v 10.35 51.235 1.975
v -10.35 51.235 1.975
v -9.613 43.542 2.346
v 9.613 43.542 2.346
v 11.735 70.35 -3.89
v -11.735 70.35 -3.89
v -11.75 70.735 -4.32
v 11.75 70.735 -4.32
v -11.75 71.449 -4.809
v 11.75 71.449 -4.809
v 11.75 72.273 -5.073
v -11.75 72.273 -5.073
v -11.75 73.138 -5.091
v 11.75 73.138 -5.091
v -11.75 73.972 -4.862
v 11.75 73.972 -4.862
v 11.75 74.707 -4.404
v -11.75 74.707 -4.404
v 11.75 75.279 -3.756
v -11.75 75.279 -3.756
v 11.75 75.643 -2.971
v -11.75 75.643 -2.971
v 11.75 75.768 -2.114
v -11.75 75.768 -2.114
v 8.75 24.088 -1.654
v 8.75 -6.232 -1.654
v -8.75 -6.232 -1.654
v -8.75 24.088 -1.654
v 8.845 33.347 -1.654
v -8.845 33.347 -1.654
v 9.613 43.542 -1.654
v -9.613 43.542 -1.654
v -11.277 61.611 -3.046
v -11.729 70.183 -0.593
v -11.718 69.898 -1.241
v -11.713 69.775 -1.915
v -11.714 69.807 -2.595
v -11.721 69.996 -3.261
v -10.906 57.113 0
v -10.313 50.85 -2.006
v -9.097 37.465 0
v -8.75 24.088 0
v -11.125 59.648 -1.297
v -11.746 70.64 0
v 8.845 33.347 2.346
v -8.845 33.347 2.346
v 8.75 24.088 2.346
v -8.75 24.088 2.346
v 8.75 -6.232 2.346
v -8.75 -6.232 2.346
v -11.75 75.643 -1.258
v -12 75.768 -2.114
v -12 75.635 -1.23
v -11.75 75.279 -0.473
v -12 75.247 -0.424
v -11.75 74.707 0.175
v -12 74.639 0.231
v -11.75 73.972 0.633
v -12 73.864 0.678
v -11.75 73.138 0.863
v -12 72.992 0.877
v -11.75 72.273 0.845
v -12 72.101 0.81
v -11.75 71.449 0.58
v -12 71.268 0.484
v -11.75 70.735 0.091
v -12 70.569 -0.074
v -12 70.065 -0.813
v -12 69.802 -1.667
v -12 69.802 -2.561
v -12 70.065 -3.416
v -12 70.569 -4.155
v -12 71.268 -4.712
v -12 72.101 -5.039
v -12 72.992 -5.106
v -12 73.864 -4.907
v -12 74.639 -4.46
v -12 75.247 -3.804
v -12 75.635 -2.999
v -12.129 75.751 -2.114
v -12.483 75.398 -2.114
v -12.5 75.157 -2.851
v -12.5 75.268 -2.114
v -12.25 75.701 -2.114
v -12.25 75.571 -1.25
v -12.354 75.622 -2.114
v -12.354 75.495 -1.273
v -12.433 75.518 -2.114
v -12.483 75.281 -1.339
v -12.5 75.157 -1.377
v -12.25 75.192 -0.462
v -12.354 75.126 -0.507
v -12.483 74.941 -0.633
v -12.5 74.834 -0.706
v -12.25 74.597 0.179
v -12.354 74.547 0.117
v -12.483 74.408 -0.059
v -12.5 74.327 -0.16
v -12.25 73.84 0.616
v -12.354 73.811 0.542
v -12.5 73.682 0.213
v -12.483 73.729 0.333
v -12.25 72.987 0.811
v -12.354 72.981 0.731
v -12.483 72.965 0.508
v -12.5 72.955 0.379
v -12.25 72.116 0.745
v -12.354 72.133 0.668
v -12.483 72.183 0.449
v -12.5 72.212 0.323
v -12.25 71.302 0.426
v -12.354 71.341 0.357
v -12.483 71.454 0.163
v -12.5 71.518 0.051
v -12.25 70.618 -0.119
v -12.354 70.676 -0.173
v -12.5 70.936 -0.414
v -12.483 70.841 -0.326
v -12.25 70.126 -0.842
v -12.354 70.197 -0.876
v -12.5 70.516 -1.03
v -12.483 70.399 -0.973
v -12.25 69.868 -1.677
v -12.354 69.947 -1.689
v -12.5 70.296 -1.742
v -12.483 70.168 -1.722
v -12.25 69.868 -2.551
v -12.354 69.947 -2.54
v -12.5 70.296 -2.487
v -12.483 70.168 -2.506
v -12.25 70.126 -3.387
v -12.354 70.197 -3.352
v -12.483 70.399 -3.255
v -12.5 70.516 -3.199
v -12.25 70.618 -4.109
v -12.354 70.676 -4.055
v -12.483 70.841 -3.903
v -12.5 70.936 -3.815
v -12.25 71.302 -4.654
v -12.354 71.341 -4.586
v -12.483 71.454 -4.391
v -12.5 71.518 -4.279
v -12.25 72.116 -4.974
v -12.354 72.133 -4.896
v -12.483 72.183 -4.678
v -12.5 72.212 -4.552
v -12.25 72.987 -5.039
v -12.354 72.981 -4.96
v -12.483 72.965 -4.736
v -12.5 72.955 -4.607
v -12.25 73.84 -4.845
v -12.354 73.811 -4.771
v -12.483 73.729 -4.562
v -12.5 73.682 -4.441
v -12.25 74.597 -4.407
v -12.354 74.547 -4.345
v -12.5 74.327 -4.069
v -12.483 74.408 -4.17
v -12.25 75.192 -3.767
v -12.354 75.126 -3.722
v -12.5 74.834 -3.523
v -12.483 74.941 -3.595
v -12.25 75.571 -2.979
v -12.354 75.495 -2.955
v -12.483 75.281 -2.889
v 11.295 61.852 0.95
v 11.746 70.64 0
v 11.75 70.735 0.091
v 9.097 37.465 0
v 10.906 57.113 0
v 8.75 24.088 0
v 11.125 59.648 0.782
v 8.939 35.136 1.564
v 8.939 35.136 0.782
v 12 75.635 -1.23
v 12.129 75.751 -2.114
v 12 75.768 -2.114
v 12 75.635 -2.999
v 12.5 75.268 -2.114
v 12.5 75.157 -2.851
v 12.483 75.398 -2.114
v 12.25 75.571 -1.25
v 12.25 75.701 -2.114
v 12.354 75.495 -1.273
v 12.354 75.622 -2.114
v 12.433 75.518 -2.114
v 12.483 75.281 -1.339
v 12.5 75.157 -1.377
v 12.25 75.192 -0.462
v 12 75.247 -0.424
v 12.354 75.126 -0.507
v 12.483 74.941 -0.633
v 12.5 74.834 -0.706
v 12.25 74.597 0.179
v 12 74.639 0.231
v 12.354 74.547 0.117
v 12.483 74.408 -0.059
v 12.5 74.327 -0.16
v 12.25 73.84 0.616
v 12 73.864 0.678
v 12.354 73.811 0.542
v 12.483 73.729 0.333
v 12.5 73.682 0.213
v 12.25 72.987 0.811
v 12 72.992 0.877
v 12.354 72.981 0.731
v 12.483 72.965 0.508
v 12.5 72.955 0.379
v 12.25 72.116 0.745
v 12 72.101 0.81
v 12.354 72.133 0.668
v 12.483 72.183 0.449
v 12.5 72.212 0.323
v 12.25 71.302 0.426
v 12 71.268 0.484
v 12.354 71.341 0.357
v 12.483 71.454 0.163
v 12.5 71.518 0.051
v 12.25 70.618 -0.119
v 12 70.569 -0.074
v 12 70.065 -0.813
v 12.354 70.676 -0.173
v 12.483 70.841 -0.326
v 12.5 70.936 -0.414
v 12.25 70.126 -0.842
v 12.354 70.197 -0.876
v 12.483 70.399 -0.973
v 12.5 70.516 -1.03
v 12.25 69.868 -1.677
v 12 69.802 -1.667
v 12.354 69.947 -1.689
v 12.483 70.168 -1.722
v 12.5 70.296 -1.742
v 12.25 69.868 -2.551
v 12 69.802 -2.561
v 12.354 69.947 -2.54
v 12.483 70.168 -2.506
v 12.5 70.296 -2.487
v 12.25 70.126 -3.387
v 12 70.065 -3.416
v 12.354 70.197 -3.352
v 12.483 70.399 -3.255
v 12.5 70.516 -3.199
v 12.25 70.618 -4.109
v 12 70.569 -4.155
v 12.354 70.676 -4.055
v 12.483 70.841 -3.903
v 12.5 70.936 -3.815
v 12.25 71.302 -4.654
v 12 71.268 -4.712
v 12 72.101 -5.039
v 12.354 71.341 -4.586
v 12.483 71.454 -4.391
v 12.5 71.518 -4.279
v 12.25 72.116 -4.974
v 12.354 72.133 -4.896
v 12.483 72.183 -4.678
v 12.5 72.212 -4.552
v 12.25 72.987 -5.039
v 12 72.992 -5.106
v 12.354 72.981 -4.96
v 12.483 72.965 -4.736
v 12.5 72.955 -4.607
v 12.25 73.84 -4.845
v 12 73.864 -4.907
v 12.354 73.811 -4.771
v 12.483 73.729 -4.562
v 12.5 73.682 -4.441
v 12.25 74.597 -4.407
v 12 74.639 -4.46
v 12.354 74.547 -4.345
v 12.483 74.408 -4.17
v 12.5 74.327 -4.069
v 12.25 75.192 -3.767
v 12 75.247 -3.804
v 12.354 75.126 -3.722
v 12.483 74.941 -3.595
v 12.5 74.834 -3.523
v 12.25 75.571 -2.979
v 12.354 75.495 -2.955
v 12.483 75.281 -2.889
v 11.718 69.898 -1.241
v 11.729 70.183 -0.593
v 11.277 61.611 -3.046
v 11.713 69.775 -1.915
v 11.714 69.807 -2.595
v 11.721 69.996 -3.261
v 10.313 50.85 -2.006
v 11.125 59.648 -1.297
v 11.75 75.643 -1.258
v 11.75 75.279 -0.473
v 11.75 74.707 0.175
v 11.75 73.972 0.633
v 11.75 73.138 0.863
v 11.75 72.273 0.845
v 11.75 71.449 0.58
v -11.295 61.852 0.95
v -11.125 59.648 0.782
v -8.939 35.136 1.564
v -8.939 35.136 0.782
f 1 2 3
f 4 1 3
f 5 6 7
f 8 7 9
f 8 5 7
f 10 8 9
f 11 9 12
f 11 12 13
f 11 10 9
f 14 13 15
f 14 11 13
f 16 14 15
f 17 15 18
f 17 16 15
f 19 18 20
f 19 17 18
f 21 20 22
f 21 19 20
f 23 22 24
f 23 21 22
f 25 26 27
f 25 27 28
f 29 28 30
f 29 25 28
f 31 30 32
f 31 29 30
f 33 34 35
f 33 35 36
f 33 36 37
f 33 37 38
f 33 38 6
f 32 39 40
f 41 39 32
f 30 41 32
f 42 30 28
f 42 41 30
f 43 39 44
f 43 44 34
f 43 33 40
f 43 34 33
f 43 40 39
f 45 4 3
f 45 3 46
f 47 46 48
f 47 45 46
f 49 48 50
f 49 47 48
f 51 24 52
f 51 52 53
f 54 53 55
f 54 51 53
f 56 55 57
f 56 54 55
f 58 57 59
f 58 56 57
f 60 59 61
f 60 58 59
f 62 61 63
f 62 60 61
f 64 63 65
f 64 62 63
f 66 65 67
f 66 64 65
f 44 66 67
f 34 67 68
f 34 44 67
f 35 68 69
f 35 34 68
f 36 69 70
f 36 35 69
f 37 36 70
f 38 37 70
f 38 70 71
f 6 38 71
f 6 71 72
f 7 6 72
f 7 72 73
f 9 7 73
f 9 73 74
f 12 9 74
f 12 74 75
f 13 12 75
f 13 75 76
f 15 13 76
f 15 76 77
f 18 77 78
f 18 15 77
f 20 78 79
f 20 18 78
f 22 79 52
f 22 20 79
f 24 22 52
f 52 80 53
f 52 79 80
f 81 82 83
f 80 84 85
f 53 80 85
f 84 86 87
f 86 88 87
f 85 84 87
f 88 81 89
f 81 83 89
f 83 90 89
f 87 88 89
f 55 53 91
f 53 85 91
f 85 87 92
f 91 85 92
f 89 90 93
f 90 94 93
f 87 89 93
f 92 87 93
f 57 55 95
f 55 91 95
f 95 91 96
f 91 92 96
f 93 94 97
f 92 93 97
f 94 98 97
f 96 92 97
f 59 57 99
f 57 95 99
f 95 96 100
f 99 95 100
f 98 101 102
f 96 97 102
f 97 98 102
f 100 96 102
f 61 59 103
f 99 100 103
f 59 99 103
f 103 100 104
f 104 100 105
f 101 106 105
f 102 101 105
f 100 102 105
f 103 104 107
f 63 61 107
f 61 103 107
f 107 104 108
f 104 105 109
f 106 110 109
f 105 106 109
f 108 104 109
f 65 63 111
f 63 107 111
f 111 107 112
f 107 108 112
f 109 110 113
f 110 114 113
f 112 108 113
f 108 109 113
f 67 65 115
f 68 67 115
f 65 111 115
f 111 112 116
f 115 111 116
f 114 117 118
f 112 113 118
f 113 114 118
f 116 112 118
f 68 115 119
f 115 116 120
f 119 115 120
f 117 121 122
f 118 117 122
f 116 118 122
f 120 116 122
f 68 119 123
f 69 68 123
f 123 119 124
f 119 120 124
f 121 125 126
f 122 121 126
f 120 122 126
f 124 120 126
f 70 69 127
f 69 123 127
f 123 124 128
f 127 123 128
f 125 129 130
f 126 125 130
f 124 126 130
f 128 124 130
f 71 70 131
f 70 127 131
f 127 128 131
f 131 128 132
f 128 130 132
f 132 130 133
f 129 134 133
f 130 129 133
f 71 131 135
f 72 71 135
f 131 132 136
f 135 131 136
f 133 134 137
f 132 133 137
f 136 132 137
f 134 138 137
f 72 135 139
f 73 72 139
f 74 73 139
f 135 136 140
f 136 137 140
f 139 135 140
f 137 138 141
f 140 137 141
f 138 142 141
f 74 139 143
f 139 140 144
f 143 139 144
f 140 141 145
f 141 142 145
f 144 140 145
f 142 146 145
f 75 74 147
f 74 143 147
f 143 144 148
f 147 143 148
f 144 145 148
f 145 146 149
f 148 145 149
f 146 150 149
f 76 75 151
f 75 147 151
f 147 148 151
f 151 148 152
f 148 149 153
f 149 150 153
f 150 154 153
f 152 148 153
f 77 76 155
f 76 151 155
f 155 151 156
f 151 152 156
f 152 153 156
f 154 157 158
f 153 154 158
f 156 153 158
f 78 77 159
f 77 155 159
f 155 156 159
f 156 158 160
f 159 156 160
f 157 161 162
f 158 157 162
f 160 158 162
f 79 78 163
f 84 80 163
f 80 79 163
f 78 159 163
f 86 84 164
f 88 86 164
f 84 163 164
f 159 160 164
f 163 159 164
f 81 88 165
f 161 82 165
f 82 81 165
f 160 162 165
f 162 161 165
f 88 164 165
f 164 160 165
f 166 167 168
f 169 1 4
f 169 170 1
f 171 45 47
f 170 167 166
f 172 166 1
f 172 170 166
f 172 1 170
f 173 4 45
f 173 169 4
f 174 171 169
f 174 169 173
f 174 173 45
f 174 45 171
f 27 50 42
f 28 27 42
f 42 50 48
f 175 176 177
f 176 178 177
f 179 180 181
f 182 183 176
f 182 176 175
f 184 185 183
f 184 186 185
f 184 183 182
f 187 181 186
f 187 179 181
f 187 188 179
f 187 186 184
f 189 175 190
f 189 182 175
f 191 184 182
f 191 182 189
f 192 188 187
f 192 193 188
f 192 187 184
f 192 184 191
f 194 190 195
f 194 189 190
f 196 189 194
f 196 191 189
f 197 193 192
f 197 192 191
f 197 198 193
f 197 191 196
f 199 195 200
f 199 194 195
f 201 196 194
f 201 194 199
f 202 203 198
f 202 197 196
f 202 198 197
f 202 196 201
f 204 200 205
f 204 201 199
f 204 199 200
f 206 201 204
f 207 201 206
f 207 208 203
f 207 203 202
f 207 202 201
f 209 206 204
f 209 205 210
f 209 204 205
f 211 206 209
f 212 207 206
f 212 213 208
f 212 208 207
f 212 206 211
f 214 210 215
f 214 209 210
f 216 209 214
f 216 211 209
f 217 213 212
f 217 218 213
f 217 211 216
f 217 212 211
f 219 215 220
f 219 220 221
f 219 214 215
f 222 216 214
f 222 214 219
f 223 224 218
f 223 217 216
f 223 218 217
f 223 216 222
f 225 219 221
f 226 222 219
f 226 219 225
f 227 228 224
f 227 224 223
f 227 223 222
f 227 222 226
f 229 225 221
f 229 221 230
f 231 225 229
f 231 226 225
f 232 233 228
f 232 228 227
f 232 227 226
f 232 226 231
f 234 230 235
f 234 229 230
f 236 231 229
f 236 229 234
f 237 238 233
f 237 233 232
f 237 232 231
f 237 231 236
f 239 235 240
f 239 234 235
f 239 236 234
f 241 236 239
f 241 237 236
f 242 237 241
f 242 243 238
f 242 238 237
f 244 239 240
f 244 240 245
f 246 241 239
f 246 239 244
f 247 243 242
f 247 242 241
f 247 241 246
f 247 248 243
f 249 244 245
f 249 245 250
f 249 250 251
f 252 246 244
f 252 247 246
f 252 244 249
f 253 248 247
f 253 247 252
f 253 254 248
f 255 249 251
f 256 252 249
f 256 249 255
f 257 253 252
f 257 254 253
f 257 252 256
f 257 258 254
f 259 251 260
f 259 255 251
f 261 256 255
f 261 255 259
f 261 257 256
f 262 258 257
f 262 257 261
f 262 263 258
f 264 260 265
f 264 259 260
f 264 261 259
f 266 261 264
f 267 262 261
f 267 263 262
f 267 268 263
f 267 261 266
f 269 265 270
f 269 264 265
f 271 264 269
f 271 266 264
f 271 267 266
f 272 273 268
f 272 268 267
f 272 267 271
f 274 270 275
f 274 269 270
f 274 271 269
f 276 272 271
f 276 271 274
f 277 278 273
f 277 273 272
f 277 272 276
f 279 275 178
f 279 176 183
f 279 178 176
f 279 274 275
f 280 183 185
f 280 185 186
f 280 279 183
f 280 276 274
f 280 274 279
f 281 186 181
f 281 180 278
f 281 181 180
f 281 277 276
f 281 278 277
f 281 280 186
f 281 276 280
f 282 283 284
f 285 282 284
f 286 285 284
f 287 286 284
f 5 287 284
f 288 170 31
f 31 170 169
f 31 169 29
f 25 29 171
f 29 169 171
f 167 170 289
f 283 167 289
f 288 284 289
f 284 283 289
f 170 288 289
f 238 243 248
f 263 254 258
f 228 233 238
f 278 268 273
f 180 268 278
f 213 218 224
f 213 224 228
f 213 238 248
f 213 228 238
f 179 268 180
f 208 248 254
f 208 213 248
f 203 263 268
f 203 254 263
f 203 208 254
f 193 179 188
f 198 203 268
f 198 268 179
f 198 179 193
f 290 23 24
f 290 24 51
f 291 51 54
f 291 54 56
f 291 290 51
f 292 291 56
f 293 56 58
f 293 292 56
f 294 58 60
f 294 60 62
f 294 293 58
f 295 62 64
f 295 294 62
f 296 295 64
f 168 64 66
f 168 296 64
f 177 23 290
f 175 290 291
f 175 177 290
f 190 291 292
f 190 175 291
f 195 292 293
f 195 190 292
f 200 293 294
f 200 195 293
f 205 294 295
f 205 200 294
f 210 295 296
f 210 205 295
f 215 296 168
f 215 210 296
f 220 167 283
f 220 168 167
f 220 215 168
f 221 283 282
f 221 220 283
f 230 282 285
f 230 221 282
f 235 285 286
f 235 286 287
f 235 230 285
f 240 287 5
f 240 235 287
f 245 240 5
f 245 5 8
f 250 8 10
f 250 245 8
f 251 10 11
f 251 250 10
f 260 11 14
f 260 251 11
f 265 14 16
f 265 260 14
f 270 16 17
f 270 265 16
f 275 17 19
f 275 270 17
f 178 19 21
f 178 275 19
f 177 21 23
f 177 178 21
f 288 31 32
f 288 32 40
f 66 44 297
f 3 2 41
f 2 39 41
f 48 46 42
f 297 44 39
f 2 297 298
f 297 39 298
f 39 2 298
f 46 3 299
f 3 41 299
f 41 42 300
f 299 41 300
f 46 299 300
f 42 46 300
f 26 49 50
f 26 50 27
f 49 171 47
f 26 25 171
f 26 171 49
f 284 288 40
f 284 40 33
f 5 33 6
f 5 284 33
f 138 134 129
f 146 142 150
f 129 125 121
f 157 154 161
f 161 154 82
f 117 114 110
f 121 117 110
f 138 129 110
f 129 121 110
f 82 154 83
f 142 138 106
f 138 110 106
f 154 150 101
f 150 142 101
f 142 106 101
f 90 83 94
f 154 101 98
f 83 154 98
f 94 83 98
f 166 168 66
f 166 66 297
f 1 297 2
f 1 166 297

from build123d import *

# Parameters (mm, degrees)
F1_DEPTH = 11.75
F3_DEPTH = 10.2
F4_R     = 3
F5_DEPTH = 12.5
F6_R     = 0.5


with BuildPart() as f1:
    # F0 (on Right) → F1 (new body, symmetric)
    with BuildSketch(Plane.YZ):
        with BuildLine():
            ThreePointArc((70.3502100474, -3.8900166392), (73.7025583371, -4.9650890437), (75.7682282921, -2.1142948795))
            ThreePointArc((75.7682282921, -2.1142948795), (73.9723491924, 0.6334483504), (70.7348330539, 0.0914484884))
            ThreePointArc((70.7348330539, 0.0914484884), (69.7821293922, -1.8258276194), (70.3502100474, -3.8900166392))
        make_face()
        with BuildLine():
            ThreePointArc((70.3502100474, -3.8900166392), (69.7821293922, -1.8258276194), (70.7348330539, 0.0914484884))
            Line((70.7348330539, 0.0914484884), (51.2349025363, 1.9752077734))
            ThreePointArc((51.2349025363, 1.9752077734), (47.3931357281, 2.2531760356), (43.5424422673, 2.3459037766))
            Line((43.5424422673, 2.3459037766), (-6.2317717079, 2.3459037766))
            Line((-6.2317717079, 2.3459037766), (-6.2317717079, -1.6540961509))
            Line((-6.2317717079, -1.6540961509), (43.5424422673, -1.6540961509))
            ThreePointArc((43.5424422673, -1.6540961509), (47.2006010586, -1.742187505), (50.8502795298, -2.0062573543))
            Line((50.8502795298, -2.0062573543), (70.3502100474, -3.8900166392))
        make_face()
    extrude(amount=F1_DEPTH, both=True)

    # F2 (on Top) → F3 (cut, symmetric)
    with BuildSketch(Plane.XY):
        with BuildLine():
            Line((8.75, 24.0882448852), (8.75, -6.2317717079))
            Line((8.75, -6.2317717079), (11.75, -6.2317717079))
            Line((11.75, -6.2317717079), (11.75, 70.7348330539))
            add(Edge.make_bspline(
                [(11.75, 70.7348330539), (11.6262901574, 67.5527974963), (11.3494589509, 59.7203740039), (8.5420361296, 34.7760059385), (8.75, 27.7926027775), (8.75, 24.0882448852)],
                knots=[0, 0, 0, 0, 0.2868478111, 0.7138684007, 1, 1, 1, 1], degree=3))
        make_face()
        with BuildLine():
            Line((-11.75, -6.2317717079), (-8.75, -6.2317717079))
            Line((-8.75, -6.2317717079), (-8.75, 24.0882448852))
            add(Edge.make_bspline(
                [(-11.75, 70.7348330539), (-11.6262901574, 67.5527974963), (-11.3494589509, 59.7203740039), (-8.5420361296, 34.7760059385), (-8.75, 27.7926027775), (-8.75, 24.0882448852)],
                knots=[0, 0, 0, 0, 0.2868478111, 0.7138684007, 1, 1, 1, 1], degree=3))
            Line((-11.75, 70.7348330539), (-11.75, -6.2317717079))
        make_face()
    extrude(amount=F3_DEPTH, both=True, mode=Mode.SUBTRACT)

    # F4 (on Right) → F5 (join, symmetric)
    with BuildSketch(Plane.YZ):
        with Locations((72.7682282921, -2.1142948795)):
            Circle(F4_R)
    extrude(amount=F5_DEPTH, both=True)

    # F6
    f6_edges = [f1.edges().sort_by_distance(p)[0] for p in [
        (12.5, 69.768228, -2.114295),
        (-12.5, 69.768228, -2.114295),
    ]]
    fillet(f6_edges, radius=F6_R)


solid = f1.part
